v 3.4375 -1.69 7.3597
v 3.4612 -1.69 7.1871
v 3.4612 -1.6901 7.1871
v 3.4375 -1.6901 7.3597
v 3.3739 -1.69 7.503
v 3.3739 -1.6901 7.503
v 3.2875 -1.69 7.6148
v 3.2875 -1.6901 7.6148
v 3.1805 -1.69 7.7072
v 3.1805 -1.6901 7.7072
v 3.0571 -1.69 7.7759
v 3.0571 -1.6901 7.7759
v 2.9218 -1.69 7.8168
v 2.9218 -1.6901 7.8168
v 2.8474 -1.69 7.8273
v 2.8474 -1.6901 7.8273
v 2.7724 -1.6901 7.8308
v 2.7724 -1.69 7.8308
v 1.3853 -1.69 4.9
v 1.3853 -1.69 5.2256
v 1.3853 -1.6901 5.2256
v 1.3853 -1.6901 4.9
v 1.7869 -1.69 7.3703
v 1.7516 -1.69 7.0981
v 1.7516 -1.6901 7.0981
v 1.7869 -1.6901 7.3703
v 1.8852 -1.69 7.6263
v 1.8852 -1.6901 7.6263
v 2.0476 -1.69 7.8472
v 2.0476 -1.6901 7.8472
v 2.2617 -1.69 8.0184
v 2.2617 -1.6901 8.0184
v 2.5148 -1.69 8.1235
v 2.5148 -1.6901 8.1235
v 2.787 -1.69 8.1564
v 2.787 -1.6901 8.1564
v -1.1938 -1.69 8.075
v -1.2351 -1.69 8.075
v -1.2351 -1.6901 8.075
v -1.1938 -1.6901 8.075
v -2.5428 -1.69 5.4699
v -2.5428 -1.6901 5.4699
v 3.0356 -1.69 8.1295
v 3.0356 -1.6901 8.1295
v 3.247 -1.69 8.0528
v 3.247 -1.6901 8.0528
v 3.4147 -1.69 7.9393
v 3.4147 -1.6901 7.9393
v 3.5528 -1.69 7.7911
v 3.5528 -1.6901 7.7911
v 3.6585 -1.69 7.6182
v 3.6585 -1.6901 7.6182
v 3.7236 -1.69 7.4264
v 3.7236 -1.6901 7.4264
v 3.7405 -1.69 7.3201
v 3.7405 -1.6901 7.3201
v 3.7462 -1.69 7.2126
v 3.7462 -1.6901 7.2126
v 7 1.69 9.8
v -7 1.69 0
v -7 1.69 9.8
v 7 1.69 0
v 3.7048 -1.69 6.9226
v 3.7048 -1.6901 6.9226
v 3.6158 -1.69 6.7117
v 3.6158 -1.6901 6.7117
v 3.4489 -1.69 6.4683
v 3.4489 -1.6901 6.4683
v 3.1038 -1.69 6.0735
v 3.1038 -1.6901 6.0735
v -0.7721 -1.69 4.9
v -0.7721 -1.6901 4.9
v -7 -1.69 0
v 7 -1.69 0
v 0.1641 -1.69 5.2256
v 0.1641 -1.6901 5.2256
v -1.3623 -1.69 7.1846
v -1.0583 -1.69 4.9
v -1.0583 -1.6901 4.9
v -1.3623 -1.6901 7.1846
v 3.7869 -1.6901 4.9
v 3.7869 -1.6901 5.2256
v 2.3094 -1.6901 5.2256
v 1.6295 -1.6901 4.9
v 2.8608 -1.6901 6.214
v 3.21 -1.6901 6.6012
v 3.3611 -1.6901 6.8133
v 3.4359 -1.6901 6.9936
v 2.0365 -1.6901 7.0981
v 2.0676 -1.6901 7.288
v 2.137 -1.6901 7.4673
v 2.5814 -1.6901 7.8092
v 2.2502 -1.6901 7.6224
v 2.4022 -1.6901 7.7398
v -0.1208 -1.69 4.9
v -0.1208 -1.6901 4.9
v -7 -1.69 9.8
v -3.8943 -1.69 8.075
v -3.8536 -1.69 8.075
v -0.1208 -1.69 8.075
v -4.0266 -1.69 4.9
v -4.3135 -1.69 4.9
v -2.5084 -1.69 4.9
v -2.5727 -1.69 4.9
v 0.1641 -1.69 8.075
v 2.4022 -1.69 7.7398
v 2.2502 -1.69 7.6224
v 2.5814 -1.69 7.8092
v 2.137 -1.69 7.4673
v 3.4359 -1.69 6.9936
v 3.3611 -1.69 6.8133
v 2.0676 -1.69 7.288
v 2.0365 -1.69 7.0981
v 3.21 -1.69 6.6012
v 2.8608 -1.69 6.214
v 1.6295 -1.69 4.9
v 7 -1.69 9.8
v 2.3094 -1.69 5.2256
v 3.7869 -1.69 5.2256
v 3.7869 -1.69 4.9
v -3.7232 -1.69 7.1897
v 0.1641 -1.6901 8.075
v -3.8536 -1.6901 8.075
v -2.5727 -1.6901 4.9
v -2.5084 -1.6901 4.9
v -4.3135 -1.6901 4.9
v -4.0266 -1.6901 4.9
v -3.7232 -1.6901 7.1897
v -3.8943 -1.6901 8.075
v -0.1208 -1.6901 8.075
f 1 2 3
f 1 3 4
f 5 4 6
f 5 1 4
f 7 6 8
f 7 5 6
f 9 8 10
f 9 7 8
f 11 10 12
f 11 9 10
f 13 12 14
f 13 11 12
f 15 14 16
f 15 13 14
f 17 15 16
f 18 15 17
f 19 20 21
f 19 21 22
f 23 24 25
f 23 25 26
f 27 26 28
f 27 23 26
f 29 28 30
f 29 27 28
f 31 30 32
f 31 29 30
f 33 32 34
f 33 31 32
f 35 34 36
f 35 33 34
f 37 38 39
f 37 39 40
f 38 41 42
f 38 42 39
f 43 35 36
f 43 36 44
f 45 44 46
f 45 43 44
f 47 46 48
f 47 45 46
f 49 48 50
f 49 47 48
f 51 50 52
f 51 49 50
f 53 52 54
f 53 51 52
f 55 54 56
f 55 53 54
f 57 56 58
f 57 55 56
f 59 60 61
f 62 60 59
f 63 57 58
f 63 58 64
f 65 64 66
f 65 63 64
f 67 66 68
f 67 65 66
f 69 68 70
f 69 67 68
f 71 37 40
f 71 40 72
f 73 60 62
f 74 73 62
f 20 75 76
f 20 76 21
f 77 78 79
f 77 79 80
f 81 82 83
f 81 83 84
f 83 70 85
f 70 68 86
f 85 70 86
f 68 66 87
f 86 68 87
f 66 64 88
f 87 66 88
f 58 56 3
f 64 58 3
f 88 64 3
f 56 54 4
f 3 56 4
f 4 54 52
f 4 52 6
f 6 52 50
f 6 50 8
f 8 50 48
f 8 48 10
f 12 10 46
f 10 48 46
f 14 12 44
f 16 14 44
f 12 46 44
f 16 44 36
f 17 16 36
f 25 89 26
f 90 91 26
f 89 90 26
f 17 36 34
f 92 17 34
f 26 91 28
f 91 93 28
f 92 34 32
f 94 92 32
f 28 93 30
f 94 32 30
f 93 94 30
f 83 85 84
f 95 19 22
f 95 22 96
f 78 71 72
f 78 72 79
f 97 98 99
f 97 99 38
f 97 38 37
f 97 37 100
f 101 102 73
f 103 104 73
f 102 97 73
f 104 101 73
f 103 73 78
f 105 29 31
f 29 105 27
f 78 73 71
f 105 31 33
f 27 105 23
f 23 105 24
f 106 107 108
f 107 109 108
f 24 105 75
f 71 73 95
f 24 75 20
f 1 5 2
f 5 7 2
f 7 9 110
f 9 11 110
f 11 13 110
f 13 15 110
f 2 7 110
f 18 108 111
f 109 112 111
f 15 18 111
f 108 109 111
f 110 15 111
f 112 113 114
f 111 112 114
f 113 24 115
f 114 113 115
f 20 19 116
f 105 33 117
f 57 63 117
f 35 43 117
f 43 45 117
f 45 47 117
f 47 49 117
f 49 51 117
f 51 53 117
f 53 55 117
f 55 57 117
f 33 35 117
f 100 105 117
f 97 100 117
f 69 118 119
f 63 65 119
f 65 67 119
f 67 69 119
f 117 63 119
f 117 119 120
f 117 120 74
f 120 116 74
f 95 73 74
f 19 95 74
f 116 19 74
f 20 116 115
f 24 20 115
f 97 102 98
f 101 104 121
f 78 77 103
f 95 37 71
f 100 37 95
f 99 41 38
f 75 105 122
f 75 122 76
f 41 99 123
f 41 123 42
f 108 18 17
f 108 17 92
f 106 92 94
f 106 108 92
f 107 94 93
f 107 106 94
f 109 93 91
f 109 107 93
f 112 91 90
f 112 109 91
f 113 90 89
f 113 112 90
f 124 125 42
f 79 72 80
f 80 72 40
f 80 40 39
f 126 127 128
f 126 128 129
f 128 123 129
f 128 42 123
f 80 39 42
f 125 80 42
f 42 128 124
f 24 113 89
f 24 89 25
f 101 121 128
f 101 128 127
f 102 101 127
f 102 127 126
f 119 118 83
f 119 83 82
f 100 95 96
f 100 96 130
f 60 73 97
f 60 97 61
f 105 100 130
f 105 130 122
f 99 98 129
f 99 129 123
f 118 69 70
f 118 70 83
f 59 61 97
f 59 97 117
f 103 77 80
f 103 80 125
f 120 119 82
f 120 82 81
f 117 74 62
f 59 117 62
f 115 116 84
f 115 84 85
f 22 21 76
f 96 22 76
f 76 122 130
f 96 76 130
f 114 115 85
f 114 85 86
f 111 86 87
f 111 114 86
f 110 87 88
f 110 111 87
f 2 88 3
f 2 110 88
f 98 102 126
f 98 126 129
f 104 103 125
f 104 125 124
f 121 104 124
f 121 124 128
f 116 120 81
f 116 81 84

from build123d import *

# Parameters (mm, degrees)
SKETCH1_W           = 14
SKETCH1_H           = 3.38
BOSS_EXTRUDE1_DEPTH = 9.8
BOSS_EXTRUDE2_DEPTH = 0.0001


with BuildPart() as part:
    # Sketch1 → Boss-Extrude1 (new body)
    with BuildSketch(Plane.XY):
        Rectangle(SKETCH1_W, SKETCH1_H)
    extrude(amount=BOSS_EXTRUDE1_DEPTH)

    # Sketch2 → Boss-Extrude2 (add)
    with BuildSketch(Plane.XZ.offset(1.69)):
        Polygon((-4.313461538, 4.9), (-3.894325921, 8.075), (-3.853620793, 8.075), (-2.542788462, 5.469871795), (-1.235136218, 8.075), (-1.193795072, 8.075), (-0.772115385, 4.9), (-1.058323317, 4.9), (-1.362339744, 7.184575321), (-2.50844351, 4.9), (-2.57268129, 4.9), (-3.723237179, 7.189663462), (-4.026617588, 4.9), align=None)
        Polygon((-0.120833333, 8.075), (0.164102564, 8.075), (0.164102564, 5.225641026), (1.38525641, 5.225641026), (1.38525641, 4.9), (-0.120833333, 4.9), align=None)
        with BuildLine():
            Line((2.036538462, 7.098076923), (1.751602564, 7.098076923))
            add(Edge.make_bspline(
                [(1.751602564, 7.098076923), (1.753459624, 7.135878371), (1.757106841, 7.210119409), (1.774186789, 7.318363239), (1.798626014, 7.421827235), (1.833180404, 7.519680657), (1.876093956, 7.612788718), (1.927556195, 7.700781589), (1.988510617, 7.783323596), (2.057641011, 7.859649547), (2.132723991, 7.9296697), (2.213737236, 7.990135528), (2.298868082, 8.041223701), (2.387858251, 8.083933113), (2.481711762, 8.115991402), (2.579576926, 8.139778175), (2.681883714, 8.154089574), (2.751588592, 8.155627894), (2.787039263, 8.156410256)],
                knots=[0, 0, 0, 0, 0.000113468, 0.000222848, 0.000328209, 0.000432002, 0.000533594, 0.000635367, 0.000737261, 0.00084084, 0.000943908, 0.001044781, 0.001143495, 0.001241361, 0.001340322, 0.001440438, 0.001543158, 0.001649467, 0.001649467, 0.001649467, 0.001649467], degree=3))
            add(Edge.make_bspline(
                [(2.787039263, 8.156410256), (2.821853659, 8.155595228), (2.890262703, 8.153993726), (2.990104673, 8.140240507), (3.085152647, 8.118699863), (3.175220835, 8.088478021), (3.259590623, 8.047852148), (3.338895813, 7.999050095), (3.414080548, 7.942607819), (3.481759559, 7.876156146), (3.543906174, 7.805215411), (3.597520363, 7.729479956), (3.643433732, 7.651257675), (3.681703985, 7.569952092), (3.709876339, 7.484797659), (3.731265142, 7.397034125), (3.743355011, 7.305753047), (3.745210502, 7.243970671), (3.746153846, 7.212560096)],
                knots=[0, 0, 0, 0, 0.000104402, 0.000205146, 0.000301729, 0.000396461, 0.000489487, 0.000581988, 0.000675485, 0.000770845, 0.000865978, 0.000958102, 0.001048749, 0.001137814, 0.001227115, 0.00131736, 0.00140848, 0.001502716, 0.001502716, 0.001502716, 0.001502716], degree=3))
            add(Edge.make_bspline(
                [(3.746153846, 7.212560096), (3.744617815, 7.168338846), (3.741572707, 7.080672367), (3.715524666, 6.951844598), (3.674842474, 6.827027711), (3.625859157, 6.726573158), (3.576444868, 6.645625632), (3.531915487, 6.578979021), (3.479786694, 6.50721906), (3.419299771, 6.430586047), (3.351705951, 6.348479726), (3.276392988, 6.260949697), (3.19282383, 6.168900306), (3.134169333, 6.106030225), (3.103776042, 6.073452524)],
                knots=[0, 0, 0, 0, 0.00013255, 0.000262774, 0.000392702, 0.000525544, 0.00059688, 0.000677142, 0.000765941, 0.000862892, 0.000969979, 0.001084979, 0.001209264, 0.001342927, 0.001342927, 0.001342927, 0.001342927], degree=3))
            Line((3.103776042, 6.073452524), (2.309390024, 5.225641026))
            Line((2.309390024, 5.225641026), (3.786858974, 5.225641026))
            Line((3.786858974, 5.225641026), (3.786858974, 4.9))
            Line((3.786858974, 4.9), (1.629487179, 4.9))
            Line((1.629487179, 4.9), (2.860817308, 6.21401242))
            add(Edge.make_bspline(
                [(2.860817308, 6.21401242), (2.890796462, 6.245307312), (2.948380282, 6.305418396), (3.029825906, 6.393178081), (3.102976988, 6.474593736), (3.168307051, 6.549511533), (3.224398874, 6.619027313), (3.274175827, 6.680889651), (3.314058899, 6.737816902), (3.35734358, 6.803803031), (3.399266263, 6.88436849), (3.435291043, 6.982824051), (3.45725737, 7.08417663), (3.45989247, 7.152667764), (3.461217949, 7.187119391)],
                knots=[0, 0, 0, 0, 0.000130011, 0.000249724, 0.000359165, 0.000458368, 0.000547868, 0.000627136, 0.000696488, 0.000756294, 0.000863824, 0.000968046, 0.001070082, 0.001173354, 0.001173354, 0.001173354, 0.001173354], degree=3))
            add(Edge.make_bspline(
                [(3.461217949, 7.187119391), (3.46064124, 7.208783231), (3.459504657, 7.2514785), (3.449473745, 7.314076581), (3.434314929, 7.374460376), (3.412593159, 7.432815624), (3.383921331, 7.488555608), (3.349020479, 7.541748179), (3.30875235, 7.593173169), (3.262169413, 7.641390804), (3.210996106, 7.685551612), (3.156935608, 7.724671318), (3.099740156, 7.75736394), (3.039650903, 7.784164112), (2.97683537, 7.805187494), (2.911172065, 7.819754919), (2.842842422, 7.828901173), (2.796184893, 7.830138671), (2.772410857, 7.830769231)],
                knots=[0, 0, 0, 0, 6.4952e-05, 0.000128007, 0.000189711, 0.000251496, 0.000314359, 0.000377338, 0.000442102, 0.000510025, 0.000578115, 0.000644657, 0.000709898, 0.00077538, 0.000841751, 0.000908254, 0.000976888, 0.001048193, 0.001048193, 0.001048193, 0.001048193], degree=3))
            add(Edge.make_bspline(
                [(2.772410857, 7.830769231), (2.747581602, 7.830120594), (2.698821044, 7.82884678), (2.627230207, 7.81993622), (2.558935252, 7.804563922), (2.493764382, 7.783539367), (2.43160733, 7.756816255), (2.372766375, 7.723531601), (2.317373612, 7.683813718), (2.265324908, 7.638782642), (2.217369727, 7.588647032), (2.175235776, 7.532757994), (2.138420277, 7.472135982), (2.106299044, 7.406944568), (2.080213525, 7.336592211), (2.060280738, 7.26132865), (2.044508385, 7.181480682), (2.039239227, 7.126339927), (2.036538462, 7.098076923)],
                knots=[0, 0, 0, 0, 7.4482e-05, 0.00014627, 0.000216015, 0.0002842, 0.000351428, 0.000418642, 0.000486589, 0.000555575, 0.000624857, 0.000694312, 0.000765104, 0.000837353, 0.000912017, 0.000989777, 0.001070732, 0.001155858, 0.001155858, 0.001155858, 0.001155858], degree=3))
        make_face()
    extrude(amount=BOSS_EXTRUDE2_DEPTH)


solid = part.part
